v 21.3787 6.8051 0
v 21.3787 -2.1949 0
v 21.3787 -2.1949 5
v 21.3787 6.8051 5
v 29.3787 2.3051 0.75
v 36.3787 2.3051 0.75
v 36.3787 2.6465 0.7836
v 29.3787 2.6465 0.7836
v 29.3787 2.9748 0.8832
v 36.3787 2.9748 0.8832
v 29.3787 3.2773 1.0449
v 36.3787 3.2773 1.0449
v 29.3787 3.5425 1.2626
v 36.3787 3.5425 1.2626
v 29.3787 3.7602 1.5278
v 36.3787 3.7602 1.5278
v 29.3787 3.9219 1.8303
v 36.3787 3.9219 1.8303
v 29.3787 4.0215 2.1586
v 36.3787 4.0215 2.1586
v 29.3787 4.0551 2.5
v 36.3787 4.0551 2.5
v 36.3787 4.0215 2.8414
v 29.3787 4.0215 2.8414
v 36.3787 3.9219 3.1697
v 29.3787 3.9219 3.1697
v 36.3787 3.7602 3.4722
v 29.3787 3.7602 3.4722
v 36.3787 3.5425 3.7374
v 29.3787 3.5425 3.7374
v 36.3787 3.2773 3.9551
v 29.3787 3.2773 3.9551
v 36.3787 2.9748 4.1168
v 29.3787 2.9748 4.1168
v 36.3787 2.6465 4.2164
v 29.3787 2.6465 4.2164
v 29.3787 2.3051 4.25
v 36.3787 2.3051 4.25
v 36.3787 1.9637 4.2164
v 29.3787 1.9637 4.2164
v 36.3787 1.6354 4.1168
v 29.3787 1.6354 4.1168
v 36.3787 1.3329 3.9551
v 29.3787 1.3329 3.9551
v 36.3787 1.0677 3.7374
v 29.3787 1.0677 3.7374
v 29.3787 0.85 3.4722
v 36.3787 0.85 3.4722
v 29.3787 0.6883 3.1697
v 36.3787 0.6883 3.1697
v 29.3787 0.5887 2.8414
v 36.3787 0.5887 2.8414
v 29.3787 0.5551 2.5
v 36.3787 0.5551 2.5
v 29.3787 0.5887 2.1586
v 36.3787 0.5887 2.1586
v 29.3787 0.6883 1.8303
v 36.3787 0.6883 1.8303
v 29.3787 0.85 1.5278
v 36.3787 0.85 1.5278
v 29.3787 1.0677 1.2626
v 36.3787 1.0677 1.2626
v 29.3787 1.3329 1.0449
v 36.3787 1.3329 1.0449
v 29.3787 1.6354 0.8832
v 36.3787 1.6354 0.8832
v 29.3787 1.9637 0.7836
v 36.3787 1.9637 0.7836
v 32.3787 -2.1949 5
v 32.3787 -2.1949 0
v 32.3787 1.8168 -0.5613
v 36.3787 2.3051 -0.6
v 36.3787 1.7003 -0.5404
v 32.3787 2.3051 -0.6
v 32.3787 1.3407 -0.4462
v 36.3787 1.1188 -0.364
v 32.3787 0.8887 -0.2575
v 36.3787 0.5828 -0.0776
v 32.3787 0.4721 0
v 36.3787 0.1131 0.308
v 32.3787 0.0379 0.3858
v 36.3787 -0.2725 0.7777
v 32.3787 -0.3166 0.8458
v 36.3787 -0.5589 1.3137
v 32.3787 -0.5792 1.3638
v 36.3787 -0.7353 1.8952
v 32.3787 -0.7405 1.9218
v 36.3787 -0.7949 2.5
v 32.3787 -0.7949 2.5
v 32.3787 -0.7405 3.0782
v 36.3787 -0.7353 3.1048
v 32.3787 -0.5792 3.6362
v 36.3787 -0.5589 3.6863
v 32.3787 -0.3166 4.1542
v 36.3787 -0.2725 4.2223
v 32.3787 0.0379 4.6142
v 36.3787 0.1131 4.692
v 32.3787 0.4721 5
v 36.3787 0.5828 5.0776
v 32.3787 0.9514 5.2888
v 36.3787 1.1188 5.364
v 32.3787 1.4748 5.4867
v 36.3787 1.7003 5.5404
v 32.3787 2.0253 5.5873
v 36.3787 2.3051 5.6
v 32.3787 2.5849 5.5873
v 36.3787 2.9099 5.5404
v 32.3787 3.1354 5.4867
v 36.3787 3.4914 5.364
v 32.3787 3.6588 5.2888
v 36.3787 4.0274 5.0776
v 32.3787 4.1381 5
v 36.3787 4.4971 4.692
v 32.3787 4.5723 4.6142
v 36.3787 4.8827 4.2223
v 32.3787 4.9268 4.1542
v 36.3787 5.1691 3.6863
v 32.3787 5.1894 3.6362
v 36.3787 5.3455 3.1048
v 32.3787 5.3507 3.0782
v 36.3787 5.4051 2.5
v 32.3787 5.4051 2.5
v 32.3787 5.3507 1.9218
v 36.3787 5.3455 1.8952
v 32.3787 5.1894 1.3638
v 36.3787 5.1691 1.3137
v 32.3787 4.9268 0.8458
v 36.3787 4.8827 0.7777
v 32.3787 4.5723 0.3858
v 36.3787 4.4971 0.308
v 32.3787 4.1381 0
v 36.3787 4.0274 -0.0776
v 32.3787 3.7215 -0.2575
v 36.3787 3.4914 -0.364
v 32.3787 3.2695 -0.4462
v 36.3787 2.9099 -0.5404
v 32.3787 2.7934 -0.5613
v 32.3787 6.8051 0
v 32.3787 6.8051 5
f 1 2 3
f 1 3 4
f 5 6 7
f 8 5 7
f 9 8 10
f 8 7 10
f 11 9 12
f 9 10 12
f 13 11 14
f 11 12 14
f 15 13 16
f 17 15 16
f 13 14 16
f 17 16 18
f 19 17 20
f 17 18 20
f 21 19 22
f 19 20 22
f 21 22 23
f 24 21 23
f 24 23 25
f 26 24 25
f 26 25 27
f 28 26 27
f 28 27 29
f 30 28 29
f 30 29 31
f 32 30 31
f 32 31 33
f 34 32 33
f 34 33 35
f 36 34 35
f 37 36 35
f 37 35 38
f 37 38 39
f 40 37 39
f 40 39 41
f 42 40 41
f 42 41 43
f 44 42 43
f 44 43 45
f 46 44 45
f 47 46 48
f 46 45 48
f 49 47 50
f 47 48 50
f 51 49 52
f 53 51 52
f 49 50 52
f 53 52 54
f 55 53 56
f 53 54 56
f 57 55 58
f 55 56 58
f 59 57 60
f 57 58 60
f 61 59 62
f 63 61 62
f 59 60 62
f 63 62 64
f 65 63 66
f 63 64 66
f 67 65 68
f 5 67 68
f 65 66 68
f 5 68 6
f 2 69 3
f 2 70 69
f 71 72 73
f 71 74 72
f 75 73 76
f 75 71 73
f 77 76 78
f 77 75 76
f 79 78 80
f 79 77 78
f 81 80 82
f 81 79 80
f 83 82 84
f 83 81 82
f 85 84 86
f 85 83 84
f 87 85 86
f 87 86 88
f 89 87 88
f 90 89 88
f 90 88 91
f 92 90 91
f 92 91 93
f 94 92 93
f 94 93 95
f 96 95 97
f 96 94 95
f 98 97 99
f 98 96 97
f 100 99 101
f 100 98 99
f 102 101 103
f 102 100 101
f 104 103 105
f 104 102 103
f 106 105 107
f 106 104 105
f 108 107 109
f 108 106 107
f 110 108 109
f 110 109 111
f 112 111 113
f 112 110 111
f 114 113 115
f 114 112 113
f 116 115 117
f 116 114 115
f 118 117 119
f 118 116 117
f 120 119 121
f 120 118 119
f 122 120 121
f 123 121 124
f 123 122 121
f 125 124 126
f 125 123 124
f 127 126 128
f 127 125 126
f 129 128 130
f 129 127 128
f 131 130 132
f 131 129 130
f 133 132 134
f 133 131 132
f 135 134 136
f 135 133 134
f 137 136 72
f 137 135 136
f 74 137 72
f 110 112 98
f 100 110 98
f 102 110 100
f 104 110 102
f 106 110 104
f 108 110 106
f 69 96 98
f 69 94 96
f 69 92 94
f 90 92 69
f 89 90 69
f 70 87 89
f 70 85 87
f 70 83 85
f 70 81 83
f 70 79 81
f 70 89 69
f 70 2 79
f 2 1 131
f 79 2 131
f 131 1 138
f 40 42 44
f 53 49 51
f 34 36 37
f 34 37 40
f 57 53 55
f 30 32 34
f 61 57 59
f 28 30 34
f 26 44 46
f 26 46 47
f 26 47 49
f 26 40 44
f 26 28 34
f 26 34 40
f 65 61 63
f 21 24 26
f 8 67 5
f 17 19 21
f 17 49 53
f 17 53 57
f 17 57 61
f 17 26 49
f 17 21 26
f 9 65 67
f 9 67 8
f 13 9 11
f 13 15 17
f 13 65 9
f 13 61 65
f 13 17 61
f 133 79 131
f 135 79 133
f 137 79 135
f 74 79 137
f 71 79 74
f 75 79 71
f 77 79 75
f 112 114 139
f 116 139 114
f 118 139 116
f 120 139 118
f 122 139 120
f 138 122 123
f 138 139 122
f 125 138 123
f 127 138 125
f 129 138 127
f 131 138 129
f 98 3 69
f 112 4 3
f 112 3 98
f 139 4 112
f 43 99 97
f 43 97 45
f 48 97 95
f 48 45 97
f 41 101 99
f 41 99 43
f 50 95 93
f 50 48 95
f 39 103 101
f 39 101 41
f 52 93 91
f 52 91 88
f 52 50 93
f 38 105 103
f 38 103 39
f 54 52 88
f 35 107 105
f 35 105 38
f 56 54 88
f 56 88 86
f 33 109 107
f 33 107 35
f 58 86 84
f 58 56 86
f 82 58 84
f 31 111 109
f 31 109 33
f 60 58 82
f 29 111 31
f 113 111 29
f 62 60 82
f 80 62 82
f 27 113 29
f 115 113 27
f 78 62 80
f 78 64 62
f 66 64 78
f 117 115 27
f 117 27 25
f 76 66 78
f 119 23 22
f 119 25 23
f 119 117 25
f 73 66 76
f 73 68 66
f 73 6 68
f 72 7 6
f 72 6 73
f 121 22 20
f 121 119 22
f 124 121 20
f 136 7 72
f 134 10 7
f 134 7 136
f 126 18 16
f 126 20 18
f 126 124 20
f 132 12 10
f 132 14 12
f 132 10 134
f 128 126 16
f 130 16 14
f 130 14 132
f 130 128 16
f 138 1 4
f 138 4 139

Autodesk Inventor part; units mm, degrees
ref_plane "YZ Plane" through (0, 0, 0) normal (1, 0, 0) x (0, 1, 0)
ref_plane "XZ Plane" through (0, 0, 0) normal (0, 1, 0) x (-1, 0, 0)
ref_plane "XY Plane" through (0, 0, 0) normal (0, 0, 1) x (1, 0, 0)
ref_plane "Work Plane1" through (0, 0, 0) normal (0, 0, 1) x (1, 0, 0)
sketch "Sketch1" plane through (0, 0, 0) normal (0, 0, 1) x (1, 0, 0)
  line L0 (21.3787, 6.8051) -> (32.3787, 6.8051)
  line L1 (32.3787, 6.8051) -> (32.3787, -2.1949)
  line L2 (32.3787, -2.1949) -> (21.3787, -2.1949)
  line L3 (21.3787, -2.1949) -> (21.3787, 6.8051)
  point P0 (0, 0)
  dimension "d0" = 11
  dimension "d2" = 9
extrude "Extrusion1" add sketch "Sketch1" along normal blind 5
sketch "Sketch2" plane through (32.3787, -2.1949, 0) normal (1, 0, 0) x (0, 0, -1)
  circle A0 centre (-2.5, 4.5) radius 3.1
  point P0 (0, 2.1949)
  dimension "d5" = 6.2
extrude "Extrusion2" add sketch "Sketch2" along normal blind 4
sketch "Sketch3" plane through (36.3787, 2.3051, 2.5) normal (1, 0, 0) x (0, 0, -1)
  circle A0 centre (0, 0) radius 3.1 projected
  circle A1 centre (0, 0) radius 1.75
  point P0 (2.5, -2.3051)
  dimension "d9" = 3.5
extrude "Extrusion3" cut sketch "Sketch3" against normal blind 7 contours A1
properties part number "nanopc_t4_headphone"
